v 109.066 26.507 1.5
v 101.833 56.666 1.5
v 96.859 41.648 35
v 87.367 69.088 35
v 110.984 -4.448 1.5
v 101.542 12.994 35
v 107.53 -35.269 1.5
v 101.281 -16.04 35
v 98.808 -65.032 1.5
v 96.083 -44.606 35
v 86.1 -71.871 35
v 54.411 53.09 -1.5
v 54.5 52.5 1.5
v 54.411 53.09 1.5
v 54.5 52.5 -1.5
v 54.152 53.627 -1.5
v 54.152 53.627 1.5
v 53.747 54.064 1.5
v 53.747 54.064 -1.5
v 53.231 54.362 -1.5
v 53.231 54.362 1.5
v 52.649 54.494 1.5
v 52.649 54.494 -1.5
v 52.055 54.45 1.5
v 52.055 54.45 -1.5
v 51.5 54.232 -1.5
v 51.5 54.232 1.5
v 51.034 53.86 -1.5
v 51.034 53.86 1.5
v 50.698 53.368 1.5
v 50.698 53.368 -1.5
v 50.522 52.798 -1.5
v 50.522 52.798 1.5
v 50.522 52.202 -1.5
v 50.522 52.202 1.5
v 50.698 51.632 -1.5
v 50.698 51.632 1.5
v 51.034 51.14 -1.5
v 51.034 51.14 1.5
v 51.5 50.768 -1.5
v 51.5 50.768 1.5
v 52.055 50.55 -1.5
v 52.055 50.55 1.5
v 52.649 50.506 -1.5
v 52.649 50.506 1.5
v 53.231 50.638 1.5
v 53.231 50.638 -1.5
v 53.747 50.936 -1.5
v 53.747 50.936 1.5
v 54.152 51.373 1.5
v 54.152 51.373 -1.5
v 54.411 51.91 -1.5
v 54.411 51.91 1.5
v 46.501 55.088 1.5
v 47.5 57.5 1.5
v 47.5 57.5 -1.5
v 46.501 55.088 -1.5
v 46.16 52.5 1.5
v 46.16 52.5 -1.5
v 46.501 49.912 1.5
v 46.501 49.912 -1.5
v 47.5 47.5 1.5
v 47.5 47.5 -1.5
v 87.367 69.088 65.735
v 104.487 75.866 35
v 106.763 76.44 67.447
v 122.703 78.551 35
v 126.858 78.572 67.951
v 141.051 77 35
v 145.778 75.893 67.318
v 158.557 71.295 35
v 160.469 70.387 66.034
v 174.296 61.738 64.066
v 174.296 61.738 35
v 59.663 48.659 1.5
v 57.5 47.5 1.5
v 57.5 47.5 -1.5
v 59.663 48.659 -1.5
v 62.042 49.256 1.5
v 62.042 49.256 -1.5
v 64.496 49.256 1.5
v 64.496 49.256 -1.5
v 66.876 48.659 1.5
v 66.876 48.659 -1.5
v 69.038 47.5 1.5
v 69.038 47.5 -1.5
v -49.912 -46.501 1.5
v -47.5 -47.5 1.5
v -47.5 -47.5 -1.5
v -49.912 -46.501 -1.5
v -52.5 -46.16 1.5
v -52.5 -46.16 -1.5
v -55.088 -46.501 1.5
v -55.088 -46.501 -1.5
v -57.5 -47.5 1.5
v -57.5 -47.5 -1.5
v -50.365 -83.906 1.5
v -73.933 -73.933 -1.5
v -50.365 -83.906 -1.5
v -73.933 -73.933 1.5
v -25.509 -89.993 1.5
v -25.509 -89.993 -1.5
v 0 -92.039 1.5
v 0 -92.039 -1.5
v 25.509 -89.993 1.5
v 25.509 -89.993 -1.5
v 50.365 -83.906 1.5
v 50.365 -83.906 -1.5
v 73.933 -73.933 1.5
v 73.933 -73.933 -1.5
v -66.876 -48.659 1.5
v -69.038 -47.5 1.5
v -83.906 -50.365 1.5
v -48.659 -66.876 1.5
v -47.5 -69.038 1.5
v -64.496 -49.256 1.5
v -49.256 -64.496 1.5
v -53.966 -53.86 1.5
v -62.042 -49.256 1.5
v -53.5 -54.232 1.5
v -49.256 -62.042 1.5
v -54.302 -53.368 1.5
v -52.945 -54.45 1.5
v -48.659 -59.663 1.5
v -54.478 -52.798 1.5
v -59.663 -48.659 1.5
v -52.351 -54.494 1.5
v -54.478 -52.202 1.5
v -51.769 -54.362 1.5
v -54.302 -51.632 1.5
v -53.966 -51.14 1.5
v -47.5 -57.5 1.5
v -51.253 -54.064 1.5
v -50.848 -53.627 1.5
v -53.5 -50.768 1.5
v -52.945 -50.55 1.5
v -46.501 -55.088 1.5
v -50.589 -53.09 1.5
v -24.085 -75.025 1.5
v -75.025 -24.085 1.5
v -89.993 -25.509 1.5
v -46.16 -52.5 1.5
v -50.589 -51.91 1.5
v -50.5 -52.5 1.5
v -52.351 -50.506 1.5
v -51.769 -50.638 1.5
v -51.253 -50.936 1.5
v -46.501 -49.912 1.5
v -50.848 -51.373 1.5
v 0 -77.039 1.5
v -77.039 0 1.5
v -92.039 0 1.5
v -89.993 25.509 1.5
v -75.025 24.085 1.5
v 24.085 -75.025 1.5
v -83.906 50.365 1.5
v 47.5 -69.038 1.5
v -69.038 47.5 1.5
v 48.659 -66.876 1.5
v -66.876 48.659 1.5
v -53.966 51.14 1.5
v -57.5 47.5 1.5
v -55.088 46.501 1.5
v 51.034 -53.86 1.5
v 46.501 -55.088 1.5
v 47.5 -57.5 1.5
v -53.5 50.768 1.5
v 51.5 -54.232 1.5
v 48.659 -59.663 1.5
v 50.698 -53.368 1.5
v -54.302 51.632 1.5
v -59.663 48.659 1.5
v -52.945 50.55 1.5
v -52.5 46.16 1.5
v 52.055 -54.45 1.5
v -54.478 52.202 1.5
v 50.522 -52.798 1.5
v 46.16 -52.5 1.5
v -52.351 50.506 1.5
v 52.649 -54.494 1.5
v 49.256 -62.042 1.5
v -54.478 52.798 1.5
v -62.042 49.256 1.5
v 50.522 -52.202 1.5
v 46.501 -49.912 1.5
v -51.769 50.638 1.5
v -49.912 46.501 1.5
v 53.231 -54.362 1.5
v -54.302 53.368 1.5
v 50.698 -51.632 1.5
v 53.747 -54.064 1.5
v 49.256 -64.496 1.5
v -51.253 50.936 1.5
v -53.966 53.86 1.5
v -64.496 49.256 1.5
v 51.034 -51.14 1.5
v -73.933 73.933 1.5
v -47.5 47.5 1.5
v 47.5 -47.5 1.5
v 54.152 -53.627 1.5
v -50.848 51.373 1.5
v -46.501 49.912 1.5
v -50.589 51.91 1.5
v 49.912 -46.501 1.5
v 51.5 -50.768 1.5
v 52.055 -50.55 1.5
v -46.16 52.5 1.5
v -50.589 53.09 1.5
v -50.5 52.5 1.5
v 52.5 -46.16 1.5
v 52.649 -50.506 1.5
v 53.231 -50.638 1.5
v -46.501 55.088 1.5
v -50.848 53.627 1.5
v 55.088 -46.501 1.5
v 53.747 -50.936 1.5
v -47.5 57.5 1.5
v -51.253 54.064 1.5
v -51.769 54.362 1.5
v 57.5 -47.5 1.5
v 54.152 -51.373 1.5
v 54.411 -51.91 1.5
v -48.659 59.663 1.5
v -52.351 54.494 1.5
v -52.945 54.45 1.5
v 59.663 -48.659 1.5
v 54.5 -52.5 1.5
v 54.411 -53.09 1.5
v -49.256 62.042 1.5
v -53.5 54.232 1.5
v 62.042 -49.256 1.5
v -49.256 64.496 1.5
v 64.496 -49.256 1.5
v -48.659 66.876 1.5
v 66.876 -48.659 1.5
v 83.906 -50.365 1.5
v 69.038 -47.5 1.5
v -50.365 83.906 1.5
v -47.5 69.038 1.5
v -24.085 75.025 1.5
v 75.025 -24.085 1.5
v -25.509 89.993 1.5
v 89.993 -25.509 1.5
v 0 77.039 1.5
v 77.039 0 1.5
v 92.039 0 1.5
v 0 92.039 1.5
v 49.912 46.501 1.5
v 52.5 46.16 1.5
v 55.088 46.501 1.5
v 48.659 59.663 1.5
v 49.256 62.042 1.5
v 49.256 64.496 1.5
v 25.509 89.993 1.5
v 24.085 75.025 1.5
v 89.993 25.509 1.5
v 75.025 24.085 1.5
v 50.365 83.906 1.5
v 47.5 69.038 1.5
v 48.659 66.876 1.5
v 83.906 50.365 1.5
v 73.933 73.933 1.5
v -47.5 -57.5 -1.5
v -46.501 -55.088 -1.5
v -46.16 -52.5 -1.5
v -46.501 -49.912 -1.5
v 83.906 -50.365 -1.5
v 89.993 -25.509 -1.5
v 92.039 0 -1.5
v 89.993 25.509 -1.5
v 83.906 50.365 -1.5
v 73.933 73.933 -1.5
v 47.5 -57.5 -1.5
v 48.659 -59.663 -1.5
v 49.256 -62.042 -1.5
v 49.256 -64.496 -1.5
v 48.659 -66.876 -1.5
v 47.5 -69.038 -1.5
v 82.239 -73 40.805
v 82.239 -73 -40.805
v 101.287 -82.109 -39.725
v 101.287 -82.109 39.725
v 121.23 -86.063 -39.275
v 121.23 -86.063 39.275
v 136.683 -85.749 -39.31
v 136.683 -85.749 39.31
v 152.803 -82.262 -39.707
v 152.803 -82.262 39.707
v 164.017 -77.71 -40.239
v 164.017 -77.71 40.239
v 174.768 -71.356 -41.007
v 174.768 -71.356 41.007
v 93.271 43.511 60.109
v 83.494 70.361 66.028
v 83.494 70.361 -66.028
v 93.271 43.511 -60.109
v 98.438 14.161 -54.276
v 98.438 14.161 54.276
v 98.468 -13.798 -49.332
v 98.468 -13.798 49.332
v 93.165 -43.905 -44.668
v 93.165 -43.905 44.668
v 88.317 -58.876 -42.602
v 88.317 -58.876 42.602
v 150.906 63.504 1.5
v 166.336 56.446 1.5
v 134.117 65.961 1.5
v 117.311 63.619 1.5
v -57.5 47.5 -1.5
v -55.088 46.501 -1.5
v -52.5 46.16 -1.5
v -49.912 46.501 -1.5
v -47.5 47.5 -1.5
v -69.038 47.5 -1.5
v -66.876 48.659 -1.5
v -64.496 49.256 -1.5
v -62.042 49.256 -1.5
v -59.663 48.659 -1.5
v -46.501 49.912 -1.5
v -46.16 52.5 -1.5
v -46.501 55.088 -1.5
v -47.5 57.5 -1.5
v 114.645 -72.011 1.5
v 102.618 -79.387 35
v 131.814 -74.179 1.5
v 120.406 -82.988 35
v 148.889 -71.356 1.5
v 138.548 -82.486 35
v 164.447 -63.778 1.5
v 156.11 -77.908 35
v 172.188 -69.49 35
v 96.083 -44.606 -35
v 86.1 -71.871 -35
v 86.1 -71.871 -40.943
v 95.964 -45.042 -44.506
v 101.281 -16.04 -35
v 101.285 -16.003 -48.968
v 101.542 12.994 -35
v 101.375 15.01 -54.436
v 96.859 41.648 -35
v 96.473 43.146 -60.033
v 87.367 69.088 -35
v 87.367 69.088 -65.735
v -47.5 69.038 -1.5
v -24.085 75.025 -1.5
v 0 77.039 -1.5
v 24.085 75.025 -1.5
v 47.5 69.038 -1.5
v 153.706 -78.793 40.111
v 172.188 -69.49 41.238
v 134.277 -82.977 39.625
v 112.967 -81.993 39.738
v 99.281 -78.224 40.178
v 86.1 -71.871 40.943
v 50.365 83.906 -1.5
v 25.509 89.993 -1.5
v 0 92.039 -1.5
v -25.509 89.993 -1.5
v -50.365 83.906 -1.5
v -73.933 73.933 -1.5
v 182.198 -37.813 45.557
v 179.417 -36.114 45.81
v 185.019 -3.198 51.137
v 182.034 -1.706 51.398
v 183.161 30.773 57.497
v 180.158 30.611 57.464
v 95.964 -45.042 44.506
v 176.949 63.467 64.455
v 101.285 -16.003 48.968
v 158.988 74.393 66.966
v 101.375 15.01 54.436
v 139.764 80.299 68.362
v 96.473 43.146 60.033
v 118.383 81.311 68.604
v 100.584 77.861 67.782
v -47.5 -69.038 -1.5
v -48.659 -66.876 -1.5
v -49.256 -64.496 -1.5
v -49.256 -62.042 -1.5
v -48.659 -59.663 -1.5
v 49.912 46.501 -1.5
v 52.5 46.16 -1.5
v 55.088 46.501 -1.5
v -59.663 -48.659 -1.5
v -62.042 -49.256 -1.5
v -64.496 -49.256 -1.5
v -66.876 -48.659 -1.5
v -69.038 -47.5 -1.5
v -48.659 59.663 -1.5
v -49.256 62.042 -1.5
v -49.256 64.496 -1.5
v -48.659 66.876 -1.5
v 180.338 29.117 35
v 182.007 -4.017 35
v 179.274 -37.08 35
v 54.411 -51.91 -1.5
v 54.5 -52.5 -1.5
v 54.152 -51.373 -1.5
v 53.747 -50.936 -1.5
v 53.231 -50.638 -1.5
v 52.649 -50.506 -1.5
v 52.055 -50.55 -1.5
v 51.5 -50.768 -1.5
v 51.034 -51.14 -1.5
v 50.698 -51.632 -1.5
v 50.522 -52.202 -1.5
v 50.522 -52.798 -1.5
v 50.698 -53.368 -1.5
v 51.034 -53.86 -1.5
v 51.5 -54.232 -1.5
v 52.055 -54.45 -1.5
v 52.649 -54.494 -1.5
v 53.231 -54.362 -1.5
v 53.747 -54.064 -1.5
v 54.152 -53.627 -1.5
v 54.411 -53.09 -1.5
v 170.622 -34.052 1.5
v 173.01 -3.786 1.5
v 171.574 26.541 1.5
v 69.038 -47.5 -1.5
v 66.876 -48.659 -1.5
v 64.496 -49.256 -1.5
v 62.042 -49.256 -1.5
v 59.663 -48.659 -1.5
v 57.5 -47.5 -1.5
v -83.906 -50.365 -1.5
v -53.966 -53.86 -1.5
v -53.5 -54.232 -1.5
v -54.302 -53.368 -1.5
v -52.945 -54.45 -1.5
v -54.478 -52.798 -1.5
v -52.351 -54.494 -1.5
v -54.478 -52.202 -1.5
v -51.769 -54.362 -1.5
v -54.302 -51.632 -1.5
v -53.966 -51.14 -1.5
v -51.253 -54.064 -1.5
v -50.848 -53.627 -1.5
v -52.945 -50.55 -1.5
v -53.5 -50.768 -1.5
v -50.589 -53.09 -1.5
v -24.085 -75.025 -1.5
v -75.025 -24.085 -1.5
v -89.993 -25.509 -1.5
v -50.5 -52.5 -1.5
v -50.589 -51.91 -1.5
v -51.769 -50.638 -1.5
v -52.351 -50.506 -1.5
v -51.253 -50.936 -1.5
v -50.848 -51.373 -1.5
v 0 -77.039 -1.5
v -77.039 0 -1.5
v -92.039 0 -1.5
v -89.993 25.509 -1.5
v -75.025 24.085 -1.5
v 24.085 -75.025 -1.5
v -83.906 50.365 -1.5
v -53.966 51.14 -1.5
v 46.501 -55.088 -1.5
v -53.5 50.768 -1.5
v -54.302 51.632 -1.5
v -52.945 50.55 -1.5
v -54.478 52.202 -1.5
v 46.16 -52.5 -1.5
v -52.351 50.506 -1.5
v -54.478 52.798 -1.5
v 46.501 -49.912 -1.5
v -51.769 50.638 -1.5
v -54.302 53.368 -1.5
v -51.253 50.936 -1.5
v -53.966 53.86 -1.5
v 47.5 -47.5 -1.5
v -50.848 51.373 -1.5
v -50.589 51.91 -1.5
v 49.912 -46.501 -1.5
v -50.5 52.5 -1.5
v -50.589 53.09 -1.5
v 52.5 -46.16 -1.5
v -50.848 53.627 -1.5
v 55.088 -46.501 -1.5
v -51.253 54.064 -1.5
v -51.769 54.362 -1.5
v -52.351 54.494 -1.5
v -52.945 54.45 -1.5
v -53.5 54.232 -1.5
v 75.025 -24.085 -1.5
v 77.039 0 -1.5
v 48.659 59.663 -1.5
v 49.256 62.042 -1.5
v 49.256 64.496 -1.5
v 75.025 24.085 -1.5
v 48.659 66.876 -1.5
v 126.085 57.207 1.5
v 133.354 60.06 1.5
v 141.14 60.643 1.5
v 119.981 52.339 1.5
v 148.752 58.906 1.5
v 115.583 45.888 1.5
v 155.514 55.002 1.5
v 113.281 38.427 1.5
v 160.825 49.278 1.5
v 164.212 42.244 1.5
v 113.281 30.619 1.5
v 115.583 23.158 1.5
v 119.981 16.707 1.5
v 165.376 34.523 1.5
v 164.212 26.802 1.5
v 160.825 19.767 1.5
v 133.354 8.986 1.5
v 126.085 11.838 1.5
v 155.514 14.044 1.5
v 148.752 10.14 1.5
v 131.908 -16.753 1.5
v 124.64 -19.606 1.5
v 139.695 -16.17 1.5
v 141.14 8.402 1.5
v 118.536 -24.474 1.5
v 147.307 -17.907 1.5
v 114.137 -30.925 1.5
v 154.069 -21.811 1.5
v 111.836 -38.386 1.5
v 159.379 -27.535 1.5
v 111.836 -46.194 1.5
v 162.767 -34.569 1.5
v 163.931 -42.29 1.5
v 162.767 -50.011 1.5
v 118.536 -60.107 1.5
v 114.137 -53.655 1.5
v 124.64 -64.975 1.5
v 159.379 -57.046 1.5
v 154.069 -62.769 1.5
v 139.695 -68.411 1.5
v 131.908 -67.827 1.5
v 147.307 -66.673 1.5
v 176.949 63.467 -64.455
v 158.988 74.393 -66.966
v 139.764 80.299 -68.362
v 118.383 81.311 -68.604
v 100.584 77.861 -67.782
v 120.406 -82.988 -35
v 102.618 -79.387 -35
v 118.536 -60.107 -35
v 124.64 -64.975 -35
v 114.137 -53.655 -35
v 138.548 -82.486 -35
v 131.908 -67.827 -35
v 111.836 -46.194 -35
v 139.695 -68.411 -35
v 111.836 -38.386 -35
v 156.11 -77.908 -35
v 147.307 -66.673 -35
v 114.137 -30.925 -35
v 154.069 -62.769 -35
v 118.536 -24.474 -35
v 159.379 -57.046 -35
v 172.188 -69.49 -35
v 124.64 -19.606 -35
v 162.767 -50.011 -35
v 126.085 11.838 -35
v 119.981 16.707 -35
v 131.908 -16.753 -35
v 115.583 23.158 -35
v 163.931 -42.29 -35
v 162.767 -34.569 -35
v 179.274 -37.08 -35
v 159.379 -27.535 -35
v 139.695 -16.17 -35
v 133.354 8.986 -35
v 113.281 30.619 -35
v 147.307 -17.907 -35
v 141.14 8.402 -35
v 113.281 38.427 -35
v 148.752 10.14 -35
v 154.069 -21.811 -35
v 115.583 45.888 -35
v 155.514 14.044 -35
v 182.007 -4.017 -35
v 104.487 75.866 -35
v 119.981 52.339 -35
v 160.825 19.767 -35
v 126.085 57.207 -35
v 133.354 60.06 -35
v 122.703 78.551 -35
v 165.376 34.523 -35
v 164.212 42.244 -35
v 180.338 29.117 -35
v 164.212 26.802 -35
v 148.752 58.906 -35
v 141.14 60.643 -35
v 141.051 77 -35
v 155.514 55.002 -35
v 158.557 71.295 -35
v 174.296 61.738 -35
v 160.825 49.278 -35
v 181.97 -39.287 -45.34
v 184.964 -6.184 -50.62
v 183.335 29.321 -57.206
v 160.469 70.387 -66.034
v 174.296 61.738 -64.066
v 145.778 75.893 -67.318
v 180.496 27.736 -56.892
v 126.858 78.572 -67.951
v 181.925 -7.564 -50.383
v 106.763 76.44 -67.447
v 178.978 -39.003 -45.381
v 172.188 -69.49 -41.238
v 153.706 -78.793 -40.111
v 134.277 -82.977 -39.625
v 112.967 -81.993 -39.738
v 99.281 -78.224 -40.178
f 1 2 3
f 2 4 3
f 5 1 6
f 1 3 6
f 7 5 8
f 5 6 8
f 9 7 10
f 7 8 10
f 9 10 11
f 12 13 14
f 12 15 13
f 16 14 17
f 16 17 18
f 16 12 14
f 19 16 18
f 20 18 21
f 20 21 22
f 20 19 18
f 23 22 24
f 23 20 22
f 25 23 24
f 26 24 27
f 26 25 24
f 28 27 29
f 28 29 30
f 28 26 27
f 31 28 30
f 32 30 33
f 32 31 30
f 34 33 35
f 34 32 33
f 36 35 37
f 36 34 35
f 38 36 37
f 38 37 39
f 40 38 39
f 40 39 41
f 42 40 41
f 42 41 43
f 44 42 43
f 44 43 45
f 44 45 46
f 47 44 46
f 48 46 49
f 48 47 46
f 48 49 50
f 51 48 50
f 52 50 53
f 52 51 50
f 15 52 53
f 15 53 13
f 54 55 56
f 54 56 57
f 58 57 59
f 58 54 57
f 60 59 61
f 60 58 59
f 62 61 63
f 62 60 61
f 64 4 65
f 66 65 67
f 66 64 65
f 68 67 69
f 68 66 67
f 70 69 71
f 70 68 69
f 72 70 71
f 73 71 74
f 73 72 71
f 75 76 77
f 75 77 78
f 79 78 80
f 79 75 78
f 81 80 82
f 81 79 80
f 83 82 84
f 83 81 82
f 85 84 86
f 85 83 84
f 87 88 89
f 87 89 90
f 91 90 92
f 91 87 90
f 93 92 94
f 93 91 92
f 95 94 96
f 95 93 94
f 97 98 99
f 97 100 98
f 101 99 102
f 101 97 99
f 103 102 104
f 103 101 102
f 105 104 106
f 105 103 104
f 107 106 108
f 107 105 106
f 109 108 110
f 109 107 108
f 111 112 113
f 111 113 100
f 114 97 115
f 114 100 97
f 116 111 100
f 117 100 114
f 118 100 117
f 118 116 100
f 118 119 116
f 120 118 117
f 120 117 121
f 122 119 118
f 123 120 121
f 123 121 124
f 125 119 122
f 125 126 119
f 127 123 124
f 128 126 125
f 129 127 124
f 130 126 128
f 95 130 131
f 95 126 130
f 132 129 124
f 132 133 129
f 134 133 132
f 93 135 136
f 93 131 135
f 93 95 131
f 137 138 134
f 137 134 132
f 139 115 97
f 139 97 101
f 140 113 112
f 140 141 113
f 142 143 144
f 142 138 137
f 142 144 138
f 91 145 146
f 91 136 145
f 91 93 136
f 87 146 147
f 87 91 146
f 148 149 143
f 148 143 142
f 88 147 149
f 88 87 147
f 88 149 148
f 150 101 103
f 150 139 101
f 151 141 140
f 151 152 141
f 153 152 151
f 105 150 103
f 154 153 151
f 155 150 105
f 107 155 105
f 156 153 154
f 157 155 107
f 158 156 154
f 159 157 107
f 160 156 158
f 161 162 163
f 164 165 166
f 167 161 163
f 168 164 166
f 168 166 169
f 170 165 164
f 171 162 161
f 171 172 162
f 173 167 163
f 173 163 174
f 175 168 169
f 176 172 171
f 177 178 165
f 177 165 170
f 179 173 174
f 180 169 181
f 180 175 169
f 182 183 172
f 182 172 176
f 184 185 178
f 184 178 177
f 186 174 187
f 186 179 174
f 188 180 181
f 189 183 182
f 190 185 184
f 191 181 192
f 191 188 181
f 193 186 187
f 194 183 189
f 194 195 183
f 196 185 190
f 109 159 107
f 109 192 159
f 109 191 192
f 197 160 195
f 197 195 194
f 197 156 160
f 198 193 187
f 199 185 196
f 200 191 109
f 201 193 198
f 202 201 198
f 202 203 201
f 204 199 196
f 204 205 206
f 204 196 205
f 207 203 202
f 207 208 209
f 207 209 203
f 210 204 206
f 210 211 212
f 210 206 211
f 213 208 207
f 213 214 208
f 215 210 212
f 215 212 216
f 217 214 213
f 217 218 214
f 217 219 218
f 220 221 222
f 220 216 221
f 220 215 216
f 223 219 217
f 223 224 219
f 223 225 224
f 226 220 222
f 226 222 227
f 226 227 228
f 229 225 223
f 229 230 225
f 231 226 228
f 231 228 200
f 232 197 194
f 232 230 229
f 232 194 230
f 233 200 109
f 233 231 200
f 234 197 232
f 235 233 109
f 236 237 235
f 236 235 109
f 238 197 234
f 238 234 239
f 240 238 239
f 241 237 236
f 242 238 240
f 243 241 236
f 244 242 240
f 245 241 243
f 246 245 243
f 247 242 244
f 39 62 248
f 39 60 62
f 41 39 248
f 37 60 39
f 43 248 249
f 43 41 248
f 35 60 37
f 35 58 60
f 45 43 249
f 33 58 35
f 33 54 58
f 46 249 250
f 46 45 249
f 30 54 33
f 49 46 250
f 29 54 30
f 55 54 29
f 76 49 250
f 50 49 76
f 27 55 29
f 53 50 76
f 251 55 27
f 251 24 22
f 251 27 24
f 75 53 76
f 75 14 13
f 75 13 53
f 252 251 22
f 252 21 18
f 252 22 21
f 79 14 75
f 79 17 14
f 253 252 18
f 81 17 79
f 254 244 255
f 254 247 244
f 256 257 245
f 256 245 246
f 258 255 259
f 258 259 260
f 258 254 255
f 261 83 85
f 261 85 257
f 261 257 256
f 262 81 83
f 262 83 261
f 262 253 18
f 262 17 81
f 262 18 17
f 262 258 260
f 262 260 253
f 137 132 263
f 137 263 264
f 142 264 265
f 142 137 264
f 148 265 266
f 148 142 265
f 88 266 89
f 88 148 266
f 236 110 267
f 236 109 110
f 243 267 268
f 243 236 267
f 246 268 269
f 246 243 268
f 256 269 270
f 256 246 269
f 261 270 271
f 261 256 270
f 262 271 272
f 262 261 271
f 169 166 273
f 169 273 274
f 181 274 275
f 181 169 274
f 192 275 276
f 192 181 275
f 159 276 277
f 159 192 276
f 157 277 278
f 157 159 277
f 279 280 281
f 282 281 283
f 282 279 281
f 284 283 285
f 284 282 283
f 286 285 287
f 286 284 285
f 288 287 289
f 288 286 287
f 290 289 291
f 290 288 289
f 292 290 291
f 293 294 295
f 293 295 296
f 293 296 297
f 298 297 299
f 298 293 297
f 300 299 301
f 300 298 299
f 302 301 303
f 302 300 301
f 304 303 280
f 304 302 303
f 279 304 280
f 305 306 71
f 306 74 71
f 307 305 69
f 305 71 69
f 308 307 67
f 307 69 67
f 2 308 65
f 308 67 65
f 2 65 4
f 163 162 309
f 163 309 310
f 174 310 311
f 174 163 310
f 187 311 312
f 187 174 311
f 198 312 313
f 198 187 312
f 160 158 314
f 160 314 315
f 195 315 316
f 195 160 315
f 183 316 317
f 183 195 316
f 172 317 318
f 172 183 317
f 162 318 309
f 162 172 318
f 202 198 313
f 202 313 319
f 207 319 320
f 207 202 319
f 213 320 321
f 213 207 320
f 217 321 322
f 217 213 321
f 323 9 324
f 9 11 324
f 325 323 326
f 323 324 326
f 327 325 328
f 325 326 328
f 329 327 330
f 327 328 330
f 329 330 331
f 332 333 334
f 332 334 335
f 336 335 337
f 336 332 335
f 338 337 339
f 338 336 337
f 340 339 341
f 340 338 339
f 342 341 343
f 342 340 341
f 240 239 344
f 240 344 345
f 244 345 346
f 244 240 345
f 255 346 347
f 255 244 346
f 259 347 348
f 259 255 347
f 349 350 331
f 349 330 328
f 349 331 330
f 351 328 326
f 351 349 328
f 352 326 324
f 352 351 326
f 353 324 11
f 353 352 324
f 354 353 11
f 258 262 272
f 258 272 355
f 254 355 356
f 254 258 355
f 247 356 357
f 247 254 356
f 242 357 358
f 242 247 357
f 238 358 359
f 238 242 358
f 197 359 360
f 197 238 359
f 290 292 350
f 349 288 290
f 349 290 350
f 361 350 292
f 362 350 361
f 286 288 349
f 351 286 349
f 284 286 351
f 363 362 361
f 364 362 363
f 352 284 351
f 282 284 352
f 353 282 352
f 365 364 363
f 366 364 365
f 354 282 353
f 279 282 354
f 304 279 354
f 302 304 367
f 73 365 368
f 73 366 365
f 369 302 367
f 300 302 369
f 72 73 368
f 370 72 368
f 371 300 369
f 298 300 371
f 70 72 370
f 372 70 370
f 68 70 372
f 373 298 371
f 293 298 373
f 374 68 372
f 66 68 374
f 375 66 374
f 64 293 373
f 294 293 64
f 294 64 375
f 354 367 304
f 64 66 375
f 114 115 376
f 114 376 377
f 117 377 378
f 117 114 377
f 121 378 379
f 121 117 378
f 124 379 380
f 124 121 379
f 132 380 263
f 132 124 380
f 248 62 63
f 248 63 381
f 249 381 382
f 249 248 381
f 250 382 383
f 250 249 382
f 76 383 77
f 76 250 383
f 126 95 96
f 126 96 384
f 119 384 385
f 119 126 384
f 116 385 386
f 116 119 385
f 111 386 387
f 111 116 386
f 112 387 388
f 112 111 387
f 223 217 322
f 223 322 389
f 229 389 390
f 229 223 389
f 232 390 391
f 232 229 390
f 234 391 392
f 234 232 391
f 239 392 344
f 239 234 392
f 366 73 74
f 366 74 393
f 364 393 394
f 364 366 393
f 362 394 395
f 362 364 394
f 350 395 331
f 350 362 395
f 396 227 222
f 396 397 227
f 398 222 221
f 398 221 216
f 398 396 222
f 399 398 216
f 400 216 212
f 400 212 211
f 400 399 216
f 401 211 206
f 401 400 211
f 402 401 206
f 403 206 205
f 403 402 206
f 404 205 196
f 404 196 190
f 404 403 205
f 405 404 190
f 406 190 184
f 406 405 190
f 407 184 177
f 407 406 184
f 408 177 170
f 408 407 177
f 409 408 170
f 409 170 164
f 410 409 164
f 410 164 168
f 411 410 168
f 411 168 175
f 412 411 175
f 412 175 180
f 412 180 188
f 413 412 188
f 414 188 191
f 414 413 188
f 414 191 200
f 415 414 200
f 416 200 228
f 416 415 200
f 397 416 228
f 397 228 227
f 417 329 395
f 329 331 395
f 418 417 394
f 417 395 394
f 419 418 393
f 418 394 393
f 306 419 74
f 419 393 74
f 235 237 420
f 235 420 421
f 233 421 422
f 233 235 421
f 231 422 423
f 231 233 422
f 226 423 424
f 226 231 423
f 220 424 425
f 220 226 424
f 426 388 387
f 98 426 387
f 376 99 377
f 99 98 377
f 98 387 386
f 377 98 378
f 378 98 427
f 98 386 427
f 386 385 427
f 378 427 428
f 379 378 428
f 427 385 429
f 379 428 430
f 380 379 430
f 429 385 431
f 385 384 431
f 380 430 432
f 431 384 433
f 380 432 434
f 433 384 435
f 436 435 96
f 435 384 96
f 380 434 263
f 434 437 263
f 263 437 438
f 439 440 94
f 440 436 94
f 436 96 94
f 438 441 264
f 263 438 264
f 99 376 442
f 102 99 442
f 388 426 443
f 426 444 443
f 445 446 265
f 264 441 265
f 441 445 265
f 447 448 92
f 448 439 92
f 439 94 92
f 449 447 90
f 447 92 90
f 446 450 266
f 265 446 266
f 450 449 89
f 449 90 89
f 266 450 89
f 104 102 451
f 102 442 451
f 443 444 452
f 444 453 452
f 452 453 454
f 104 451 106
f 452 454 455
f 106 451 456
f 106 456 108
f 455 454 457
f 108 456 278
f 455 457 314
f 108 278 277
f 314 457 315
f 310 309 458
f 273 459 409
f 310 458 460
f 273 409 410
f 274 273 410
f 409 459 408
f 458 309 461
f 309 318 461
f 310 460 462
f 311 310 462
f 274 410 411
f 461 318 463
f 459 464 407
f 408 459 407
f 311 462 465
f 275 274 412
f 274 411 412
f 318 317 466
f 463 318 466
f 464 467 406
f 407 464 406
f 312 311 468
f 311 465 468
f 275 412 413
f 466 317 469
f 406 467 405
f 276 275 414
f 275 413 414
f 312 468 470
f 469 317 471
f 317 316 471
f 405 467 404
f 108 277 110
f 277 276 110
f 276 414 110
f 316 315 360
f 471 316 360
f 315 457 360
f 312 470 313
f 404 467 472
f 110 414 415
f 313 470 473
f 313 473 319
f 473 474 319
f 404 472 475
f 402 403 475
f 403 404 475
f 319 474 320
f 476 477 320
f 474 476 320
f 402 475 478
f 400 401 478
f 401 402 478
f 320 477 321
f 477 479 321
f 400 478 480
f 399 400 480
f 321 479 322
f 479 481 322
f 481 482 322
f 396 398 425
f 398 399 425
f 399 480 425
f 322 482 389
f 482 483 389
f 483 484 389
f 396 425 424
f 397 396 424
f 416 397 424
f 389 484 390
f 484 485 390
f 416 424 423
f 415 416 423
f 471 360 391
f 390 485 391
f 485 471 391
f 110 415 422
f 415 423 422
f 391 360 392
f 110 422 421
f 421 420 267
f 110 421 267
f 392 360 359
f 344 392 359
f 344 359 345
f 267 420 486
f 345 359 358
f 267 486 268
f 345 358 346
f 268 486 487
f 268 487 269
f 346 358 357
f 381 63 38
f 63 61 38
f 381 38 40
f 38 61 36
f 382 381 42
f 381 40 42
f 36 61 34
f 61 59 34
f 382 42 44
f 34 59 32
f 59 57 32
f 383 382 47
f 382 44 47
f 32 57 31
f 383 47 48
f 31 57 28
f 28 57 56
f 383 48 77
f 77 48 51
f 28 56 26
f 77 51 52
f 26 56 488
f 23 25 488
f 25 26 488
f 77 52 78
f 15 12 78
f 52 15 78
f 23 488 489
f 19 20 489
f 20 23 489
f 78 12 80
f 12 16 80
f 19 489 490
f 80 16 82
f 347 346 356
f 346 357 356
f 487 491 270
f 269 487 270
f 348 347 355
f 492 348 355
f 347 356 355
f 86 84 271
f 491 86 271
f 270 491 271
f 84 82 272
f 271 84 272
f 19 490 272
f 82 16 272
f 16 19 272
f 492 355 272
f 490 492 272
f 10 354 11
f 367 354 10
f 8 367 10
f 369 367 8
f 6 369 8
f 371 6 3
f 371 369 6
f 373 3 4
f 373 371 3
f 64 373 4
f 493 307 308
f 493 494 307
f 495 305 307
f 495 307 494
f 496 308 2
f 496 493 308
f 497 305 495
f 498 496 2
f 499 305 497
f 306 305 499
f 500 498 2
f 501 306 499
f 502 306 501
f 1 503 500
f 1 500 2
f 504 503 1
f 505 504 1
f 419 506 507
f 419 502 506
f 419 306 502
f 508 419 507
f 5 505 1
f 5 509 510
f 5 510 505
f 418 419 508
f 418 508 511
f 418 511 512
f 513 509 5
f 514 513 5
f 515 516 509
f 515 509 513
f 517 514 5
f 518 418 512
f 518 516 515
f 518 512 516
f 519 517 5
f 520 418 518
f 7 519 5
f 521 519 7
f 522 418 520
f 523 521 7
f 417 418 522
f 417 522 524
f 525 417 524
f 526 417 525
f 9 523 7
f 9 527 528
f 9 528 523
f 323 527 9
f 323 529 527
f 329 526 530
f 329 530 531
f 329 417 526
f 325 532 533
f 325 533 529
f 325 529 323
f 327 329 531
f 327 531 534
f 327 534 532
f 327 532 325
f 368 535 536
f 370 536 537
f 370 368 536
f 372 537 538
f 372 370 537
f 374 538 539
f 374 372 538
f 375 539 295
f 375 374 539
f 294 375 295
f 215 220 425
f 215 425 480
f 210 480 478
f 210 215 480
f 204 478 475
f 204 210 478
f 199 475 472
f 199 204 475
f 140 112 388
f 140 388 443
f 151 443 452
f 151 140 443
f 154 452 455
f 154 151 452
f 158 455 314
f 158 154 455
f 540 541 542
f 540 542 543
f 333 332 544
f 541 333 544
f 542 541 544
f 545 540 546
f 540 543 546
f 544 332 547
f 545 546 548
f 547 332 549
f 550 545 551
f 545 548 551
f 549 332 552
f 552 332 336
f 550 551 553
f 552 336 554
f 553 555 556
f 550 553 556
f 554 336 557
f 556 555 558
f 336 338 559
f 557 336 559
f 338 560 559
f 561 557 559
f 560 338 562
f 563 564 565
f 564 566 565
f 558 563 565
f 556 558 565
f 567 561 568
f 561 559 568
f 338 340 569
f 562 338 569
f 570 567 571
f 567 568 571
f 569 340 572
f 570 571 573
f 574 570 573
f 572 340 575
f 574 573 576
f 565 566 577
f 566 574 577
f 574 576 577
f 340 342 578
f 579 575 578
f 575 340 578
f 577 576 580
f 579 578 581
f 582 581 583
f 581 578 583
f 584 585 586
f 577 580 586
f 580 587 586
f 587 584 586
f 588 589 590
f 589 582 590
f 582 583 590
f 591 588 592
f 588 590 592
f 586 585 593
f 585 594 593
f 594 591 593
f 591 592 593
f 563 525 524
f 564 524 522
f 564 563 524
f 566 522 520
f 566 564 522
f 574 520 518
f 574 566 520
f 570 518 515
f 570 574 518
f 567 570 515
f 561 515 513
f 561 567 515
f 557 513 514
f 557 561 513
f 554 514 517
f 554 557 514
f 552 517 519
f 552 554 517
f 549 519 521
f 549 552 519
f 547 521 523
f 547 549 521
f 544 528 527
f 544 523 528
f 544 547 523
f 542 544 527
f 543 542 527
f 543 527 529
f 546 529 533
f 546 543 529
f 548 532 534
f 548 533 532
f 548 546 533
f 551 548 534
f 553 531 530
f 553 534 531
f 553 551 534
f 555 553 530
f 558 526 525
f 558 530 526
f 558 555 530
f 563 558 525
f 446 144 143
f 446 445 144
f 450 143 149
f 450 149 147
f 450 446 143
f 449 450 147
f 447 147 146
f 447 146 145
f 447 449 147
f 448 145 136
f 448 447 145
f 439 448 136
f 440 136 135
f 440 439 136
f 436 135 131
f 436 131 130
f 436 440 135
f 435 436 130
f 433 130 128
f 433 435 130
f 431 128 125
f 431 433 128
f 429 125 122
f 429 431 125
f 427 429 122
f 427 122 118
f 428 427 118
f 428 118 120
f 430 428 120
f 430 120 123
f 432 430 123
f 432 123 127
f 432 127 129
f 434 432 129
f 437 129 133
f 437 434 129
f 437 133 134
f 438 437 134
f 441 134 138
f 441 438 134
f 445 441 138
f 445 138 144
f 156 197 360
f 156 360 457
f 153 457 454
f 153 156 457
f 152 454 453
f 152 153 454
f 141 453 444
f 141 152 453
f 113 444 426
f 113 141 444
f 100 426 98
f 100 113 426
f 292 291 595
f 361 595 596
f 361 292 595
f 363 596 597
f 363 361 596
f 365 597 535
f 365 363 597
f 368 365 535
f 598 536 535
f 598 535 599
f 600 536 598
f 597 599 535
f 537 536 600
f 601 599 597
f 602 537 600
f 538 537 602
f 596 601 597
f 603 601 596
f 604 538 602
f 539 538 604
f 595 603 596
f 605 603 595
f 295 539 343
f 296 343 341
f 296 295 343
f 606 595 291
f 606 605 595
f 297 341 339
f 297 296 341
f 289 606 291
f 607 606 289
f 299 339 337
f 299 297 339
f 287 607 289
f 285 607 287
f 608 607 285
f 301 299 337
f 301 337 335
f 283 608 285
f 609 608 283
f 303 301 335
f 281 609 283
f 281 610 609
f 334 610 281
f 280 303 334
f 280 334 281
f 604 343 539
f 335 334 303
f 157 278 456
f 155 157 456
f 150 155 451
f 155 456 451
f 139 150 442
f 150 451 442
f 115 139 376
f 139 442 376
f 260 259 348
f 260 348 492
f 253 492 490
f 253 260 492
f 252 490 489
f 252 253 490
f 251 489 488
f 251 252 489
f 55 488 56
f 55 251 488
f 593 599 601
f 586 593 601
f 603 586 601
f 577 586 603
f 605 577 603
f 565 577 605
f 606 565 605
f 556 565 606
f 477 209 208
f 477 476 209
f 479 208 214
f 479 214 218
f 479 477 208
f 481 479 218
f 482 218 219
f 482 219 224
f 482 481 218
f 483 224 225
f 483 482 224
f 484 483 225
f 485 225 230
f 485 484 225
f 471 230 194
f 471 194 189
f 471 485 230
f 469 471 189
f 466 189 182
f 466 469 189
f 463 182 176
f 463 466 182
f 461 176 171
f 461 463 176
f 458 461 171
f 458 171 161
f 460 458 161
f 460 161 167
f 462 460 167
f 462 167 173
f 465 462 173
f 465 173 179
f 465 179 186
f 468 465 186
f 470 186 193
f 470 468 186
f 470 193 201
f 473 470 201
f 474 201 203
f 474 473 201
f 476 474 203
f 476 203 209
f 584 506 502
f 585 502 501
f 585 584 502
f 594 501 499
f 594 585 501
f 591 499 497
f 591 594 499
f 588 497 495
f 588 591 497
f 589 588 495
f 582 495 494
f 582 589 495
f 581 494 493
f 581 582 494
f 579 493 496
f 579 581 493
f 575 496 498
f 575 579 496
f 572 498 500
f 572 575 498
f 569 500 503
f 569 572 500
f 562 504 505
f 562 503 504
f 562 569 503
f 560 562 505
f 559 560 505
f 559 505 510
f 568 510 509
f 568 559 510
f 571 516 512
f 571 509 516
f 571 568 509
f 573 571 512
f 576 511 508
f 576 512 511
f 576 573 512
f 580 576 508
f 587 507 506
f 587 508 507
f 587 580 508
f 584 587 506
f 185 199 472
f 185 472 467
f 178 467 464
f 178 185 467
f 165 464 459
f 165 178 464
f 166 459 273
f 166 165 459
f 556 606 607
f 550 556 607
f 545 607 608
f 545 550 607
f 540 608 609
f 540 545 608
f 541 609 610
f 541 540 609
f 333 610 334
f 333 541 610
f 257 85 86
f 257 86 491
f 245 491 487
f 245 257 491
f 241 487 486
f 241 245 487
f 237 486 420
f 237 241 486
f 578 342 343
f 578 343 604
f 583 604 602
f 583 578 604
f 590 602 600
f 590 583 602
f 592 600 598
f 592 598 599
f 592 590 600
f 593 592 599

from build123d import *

# Parameters (mm, degrees)
F0_R     = 2
F1_DEPTH = 1.5
F3_DEPTH = 70
F4_R     = 1379.34181
F5_DEPTH = 1210
F2_R     = 31.19375
F2_R_2   = 26.19375
F6_DEPTH = 35


with BuildPart() as f1:
    # F0 (on Top) → F1 (new body, symmetric)
    with BuildSketch(Plane.XY):
        with BuildLine():
            ThreePointArc((73.933257, -73.933257), (92.039376, 0), (73.933257, 73.933257))
            ThreePointArc((73.933257, 73.933257), (0, 92.039376), (-73.933257, 73.933257))
            ThreePointArc((-73.933257, 73.933257), (-92.039376, 0), (-73.933257, -73.933257))
            ThreePointArc((-73.933257, -73.933257), (0, -92.039376), (73.933257, -73.933257))
        make_face()
        with BuildLine():
            ThreePointArc((47.5, 69.038464), (55.217238, 66.114193), (62.755609, 62.755609))
            ThreePointArc((62.755609, 62.755609), (66.114193, 55.217238), (69.038464, 47.5))
            ThreePointArc((69.038464, 47.5), (77.039376, 0), (69.038464, -47.5))
            ThreePointArc((69.038464, -47.5), (66.114193, -55.217238), (62.755609, -62.755609))
            ThreePointArc((62.755609, -62.755609), (55.217238, -66.114193), (47.5, -69.038464))
            ThreePointArc((47.5, -69.038464), (0, -77.039376), (-47.5, -69.038464))
            ThreePointArc((-47.5, -69.038464), (-55.217238, -66.114193), (-62.755609, -62.755609))
            ThreePointArc((-62.755609, -62.755609), (-66.114193, -55.217238), (-69.038464, -47.5))
            ThreePointArc((-69.038464, -47.5), (-77.039376, 0), (-69.038464, 47.5))
            ThreePointArc((-69.038464, 47.5), (-66.114193, 55.217238), (-62.755609, 62.755609))
            ThreePointArc((-62.755609, 62.755609), (-55.217238, 66.114193), (-47.5, 69.038464))
            ThreePointArc((-47.5, 69.038464), (0, 77.039376), (47.5, 69.038464))
        make_face(mode=Mode.SUBTRACT)
        with BuildLine():
            ThreePointArc((-47.5, 57.5), (-49.332016, 63.269232), (-47.5, 69.038464))
            ThreePointArc((-47.5, 69.038464), (-55.217238, 66.114193), (-62.755609, 62.755609))
            ThreePointArc((-62.755609, 62.755609), (-66.114193, 55.217238), (-69.038464, 47.5))
            ThreePointArc((-69.038464, 47.5), (-63.269232, 49.332016), (-57.5, 47.5))
            ThreePointArc((-57.5, 47.5), (-58.839746, 52.5), (-57.5, 57.5))
            ThreePointArc((-57.5, 57.5), (-52.5, 58.839746), (-47.5, 57.5))
        make_face()
        with BuildLine():
            ThreePointArc((-47.5, 47.5), (-46.160254, 52.5), (-47.5, 57.5))
            ThreePointArc((-47.5, 57.5), (-52.5, 58.839746), (-57.5, 57.5))
            ThreePointArc((-57.5, 57.5), (-58.839746, 52.5), (-57.5, 47.5))
            ThreePointArc((-57.5, 47.5), (-52.5, 46.160254), (-47.5, 47.5))
        make_face()
        with Locations((-52.5, 52.5)):
            Circle(F0_R, mode=Mode.SUBTRACT)
        with BuildLine():
            ThreePointArc((69.038464, 47.5), (66.114193, 55.217238), (62.755609, 62.755609))
            ThreePointArc((62.755609, 62.755609), (55.217238, 66.114193), (47.5, 69.038464))
            ThreePointArc((47.5, 69.038464), (49.332016, 63.269232), (47.5, 57.5))
            ThreePointArc((47.5, 57.5), (52.5, 58.839746), (57.5, 57.5))
            ThreePointArc((57.5, 57.5), (58.839746, 52.5), (57.5, 47.5))
            ThreePointArc((57.5, 47.5), (63.269232, 49.332016), (69.038464, 47.5))
        make_face()
        with BuildLine():
            ThreePointArc((57.5, 57.5), (52.5, 58.839746), (47.5, 57.5))
            ThreePointArc((47.5, 57.5), (46.160254, 52.5), (47.5, 47.5))
            ThreePointArc((47.5, 47.5), (52.5, 46.160254), (57.5, 47.5))
            ThreePointArc((57.5, 47.5), (58.839746, 52.5), (57.5, 57.5))
        make_face()
        with Locations((52.5, 52.5)):
            Circle(F0_R, mode=Mode.SUBTRACT)
        with BuildLine():
            ThreePointArc((62.755609, -62.755609), (66.114193, -55.217238), (69.038464, -47.5))
            ThreePointArc((69.038464, -47.5), (63.269232, -49.332016), (57.5, -47.5))
            ThreePointArc((57.5, -47.5), (58.839746, -52.5), (57.5, -57.5))
            ThreePointArc((57.5, -57.5), (52.5, -58.839746), (47.5, -57.5))
            ThreePointArc((47.5, -57.5), (49.332016, -63.269232), (47.5, -69.038464))
            ThreePointArc((47.5, -69.038464), (55.217238, -66.114193), (62.755609, -62.755609))
        make_face()
        with BuildLine():
            ThreePointArc((57.5, -57.5), (58.839746, -52.5), (57.5, -47.5))
            ThreePointArc((57.5, -47.5), (52.5, -46.160254), (47.5, -47.5))
            ThreePointArc((47.5, -47.5), (46.160254, -52.5), (47.5, -57.5))
            ThreePointArc((47.5, -57.5), (52.5, -58.839746), (57.5, -57.5))
        make_face()
        with Locations((52.5, -52.5)):
            Circle(F0_R, mode=Mode.SUBTRACT)
        with BuildLine():
            ThreePointArc((-57.5, -47.5), (-63.269232, -49.332016), (-69.038464, -47.5))
            ThreePointArc((-69.038464, -47.5), (-66.114193, -55.217238), (-62.755609, -62.755609))
            ThreePointArc((-62.755609, -62.755609), (-55.217238, -66.114193), (-47.5, -69.038464))
            ThreePointArc((-47.5, -69.038464), (-49.332016, -63.269232), (-47.5, -57.5))
            ThreePointArc((-47.5, -57.5), (-52.5, -58.839746), (-57.5, -57.5))
            ThreePointArc((-57.5, -57.5), (-58.839746, -52.5), (-57.5, -47.5))
        make_face()
        with BuildLine():
            ThreePointArc((-47.5, -47.5), (-52.5, -46.160254), (-57.5, -47.5))
            ThreePointArc((-57.5, -47.5), (-58.839746, -52.5), (-57.5, -57.5))
            ThreePointArc((-57.5, -57.5), (-52.5, -58.839746), (-47.5, -57.5))
            ThreePointArc((-47.5, -57.5), (-46.160254, -52.5), (-47.5, -47.5))
        make_face()
        with Locations((-52.5, -52.5)):
            Circle(F0_R, mode=Mode.SUBTRACT)
    extrude(amount=F1_DEPTH, both=True)


with BuildPart() as f3:
    # F2 (on Top) → F3 (new body, symmetric)
    with BuildSketch(Plane.XY):
        with BuildLine():
            ThreePointArc((174.768302, -71.355929), (185.006277, -4.092311), (176.949372, 63.467268))
            ThreePointArc((176.949372, 63.467268), (131.287386, 81.364594), (83.493642, 70.360539))
            ThreePointArc((83.493642, 70.360539), (99.032985, -1.460991), (82.239415, -72.999647))
            ThreePointArc((82.239415, -72.999647), (128.754204, -86.27037), (174.768302, -71.355929))
        make_face()
        with BuildLine():
            ThreePointArc((172.18752, -69.490065), (129.491328, -83.252895), (86.099817, -71.870583))
            ThreePointArc((86.099817, -71.870583), (102.032502, -1.528788), (87.367492, 69.088178))
            ThreePointArc((87.367492, 69.088178), (131.921845, 78.305036), (174.296209, 61.738377))
            ThreePointArc((174.296209, 61.738377), (182.007106, -4.016691), (172.18752, -69.490065))
        make_face(mode=Mode.SUBTRACT)
    extrude(amount=F3_DEPTH, both=True)

    # F4 (on Right) → F5 (cut)
    with BuildSketch(Plane.YZ):
        with Locations((-240, 1410)):
            Circle(F4_R)
        with Locations((-240, -1410)):
            Circle(F4_R)
    extrude(amount=F5_DEPTH, mode=Mode.SUBTRACT)

    # F2 (on Top) → F6 (join, symmetric)
    with BuildSketch(Plane.XY):
        with BuildLine():
            ThreePointArc((87.367492, 69.088178), (102.032502, -1.528788), (86.099817, -71.870583))
            ThreePointArc((86.099817, -71.870583), (129.491328, -83.252895), (172.18752, -69.490065))
            ThreePointArc((172.18752, -69.490065), (182.007106, -4.016691), (174.296209, 61.738377))
            ThreePointArc((174.296209, 61.738377), (131.921845, 78.305036), (87.367492, 69.088178))
        make_face()
        with Locations((137.737056, -42.290242)):
            Circle(F2_R, mode=Mode.SUBTRACT)
        with Locations((139.182257, 34.522846)):
            Circle(F2_R, mode=Mode.SUBTRACT)
        with Locations((139.182257, 34.522846)):
            Circle(F2_R)
        with Locations((139.182257, 34.522846)):
            Circle(F2_R_2, mode=Mode.SUBTRACT)
        with Locations((137.737056, -42.290242)):
            Circle(F2_R)
        with Locations((137.737056, -42.290242)):
            Circle(F2_R_2, mode=Mode.SUBTRACT)
    extrude(amount=F6_DEPTH, both=True)

    # F9 (on offset) → F10 section 0
    with BuildSketch(Plane.XY.offset(1.5)):
        with BuildLine():
            ThreePointArc((98.808191, -65.032023), (131.814351, -74.178902), (164.447099, -63.778148))
            ThreePointArc((164.447099, -63.778148), (173.009641, -3.785908), (166.335948, 56.44571))
            ThreePointArc((166.335948, 56.44571), (134.116729, 65.960947), (101.83327, 56.665998))
            ThreePointArc((101.83327, 56.665998), (110.984106, -4.448075), (98.808191, -65.032023))
        make_face()
    # F7 (on face) → F10 section 1
    with BuildSketch(Plane.XY.offset(35)):
        with BuildLine():
            ThreePointArc((172.18752, -69.490065), (182.007106, -4.016691), (174.296209, 61.738377))
            ThreePointArc((174.296209, 61.738377), (131.921845, 78.305036), (87.367492, 69.088178))
            ThreePointArc((87.367492, 69.088178), (102.032502, -1.528788), (86.099817, -71.870583))
            ThreePointArc((86.099817, -71.870583), (129.491328, -83.252895), (172.18752, -69.490065))
        make_face()
    loft(mode=Mode.SUBTRACT)


solid = Compound([f1.part, f3.part])
